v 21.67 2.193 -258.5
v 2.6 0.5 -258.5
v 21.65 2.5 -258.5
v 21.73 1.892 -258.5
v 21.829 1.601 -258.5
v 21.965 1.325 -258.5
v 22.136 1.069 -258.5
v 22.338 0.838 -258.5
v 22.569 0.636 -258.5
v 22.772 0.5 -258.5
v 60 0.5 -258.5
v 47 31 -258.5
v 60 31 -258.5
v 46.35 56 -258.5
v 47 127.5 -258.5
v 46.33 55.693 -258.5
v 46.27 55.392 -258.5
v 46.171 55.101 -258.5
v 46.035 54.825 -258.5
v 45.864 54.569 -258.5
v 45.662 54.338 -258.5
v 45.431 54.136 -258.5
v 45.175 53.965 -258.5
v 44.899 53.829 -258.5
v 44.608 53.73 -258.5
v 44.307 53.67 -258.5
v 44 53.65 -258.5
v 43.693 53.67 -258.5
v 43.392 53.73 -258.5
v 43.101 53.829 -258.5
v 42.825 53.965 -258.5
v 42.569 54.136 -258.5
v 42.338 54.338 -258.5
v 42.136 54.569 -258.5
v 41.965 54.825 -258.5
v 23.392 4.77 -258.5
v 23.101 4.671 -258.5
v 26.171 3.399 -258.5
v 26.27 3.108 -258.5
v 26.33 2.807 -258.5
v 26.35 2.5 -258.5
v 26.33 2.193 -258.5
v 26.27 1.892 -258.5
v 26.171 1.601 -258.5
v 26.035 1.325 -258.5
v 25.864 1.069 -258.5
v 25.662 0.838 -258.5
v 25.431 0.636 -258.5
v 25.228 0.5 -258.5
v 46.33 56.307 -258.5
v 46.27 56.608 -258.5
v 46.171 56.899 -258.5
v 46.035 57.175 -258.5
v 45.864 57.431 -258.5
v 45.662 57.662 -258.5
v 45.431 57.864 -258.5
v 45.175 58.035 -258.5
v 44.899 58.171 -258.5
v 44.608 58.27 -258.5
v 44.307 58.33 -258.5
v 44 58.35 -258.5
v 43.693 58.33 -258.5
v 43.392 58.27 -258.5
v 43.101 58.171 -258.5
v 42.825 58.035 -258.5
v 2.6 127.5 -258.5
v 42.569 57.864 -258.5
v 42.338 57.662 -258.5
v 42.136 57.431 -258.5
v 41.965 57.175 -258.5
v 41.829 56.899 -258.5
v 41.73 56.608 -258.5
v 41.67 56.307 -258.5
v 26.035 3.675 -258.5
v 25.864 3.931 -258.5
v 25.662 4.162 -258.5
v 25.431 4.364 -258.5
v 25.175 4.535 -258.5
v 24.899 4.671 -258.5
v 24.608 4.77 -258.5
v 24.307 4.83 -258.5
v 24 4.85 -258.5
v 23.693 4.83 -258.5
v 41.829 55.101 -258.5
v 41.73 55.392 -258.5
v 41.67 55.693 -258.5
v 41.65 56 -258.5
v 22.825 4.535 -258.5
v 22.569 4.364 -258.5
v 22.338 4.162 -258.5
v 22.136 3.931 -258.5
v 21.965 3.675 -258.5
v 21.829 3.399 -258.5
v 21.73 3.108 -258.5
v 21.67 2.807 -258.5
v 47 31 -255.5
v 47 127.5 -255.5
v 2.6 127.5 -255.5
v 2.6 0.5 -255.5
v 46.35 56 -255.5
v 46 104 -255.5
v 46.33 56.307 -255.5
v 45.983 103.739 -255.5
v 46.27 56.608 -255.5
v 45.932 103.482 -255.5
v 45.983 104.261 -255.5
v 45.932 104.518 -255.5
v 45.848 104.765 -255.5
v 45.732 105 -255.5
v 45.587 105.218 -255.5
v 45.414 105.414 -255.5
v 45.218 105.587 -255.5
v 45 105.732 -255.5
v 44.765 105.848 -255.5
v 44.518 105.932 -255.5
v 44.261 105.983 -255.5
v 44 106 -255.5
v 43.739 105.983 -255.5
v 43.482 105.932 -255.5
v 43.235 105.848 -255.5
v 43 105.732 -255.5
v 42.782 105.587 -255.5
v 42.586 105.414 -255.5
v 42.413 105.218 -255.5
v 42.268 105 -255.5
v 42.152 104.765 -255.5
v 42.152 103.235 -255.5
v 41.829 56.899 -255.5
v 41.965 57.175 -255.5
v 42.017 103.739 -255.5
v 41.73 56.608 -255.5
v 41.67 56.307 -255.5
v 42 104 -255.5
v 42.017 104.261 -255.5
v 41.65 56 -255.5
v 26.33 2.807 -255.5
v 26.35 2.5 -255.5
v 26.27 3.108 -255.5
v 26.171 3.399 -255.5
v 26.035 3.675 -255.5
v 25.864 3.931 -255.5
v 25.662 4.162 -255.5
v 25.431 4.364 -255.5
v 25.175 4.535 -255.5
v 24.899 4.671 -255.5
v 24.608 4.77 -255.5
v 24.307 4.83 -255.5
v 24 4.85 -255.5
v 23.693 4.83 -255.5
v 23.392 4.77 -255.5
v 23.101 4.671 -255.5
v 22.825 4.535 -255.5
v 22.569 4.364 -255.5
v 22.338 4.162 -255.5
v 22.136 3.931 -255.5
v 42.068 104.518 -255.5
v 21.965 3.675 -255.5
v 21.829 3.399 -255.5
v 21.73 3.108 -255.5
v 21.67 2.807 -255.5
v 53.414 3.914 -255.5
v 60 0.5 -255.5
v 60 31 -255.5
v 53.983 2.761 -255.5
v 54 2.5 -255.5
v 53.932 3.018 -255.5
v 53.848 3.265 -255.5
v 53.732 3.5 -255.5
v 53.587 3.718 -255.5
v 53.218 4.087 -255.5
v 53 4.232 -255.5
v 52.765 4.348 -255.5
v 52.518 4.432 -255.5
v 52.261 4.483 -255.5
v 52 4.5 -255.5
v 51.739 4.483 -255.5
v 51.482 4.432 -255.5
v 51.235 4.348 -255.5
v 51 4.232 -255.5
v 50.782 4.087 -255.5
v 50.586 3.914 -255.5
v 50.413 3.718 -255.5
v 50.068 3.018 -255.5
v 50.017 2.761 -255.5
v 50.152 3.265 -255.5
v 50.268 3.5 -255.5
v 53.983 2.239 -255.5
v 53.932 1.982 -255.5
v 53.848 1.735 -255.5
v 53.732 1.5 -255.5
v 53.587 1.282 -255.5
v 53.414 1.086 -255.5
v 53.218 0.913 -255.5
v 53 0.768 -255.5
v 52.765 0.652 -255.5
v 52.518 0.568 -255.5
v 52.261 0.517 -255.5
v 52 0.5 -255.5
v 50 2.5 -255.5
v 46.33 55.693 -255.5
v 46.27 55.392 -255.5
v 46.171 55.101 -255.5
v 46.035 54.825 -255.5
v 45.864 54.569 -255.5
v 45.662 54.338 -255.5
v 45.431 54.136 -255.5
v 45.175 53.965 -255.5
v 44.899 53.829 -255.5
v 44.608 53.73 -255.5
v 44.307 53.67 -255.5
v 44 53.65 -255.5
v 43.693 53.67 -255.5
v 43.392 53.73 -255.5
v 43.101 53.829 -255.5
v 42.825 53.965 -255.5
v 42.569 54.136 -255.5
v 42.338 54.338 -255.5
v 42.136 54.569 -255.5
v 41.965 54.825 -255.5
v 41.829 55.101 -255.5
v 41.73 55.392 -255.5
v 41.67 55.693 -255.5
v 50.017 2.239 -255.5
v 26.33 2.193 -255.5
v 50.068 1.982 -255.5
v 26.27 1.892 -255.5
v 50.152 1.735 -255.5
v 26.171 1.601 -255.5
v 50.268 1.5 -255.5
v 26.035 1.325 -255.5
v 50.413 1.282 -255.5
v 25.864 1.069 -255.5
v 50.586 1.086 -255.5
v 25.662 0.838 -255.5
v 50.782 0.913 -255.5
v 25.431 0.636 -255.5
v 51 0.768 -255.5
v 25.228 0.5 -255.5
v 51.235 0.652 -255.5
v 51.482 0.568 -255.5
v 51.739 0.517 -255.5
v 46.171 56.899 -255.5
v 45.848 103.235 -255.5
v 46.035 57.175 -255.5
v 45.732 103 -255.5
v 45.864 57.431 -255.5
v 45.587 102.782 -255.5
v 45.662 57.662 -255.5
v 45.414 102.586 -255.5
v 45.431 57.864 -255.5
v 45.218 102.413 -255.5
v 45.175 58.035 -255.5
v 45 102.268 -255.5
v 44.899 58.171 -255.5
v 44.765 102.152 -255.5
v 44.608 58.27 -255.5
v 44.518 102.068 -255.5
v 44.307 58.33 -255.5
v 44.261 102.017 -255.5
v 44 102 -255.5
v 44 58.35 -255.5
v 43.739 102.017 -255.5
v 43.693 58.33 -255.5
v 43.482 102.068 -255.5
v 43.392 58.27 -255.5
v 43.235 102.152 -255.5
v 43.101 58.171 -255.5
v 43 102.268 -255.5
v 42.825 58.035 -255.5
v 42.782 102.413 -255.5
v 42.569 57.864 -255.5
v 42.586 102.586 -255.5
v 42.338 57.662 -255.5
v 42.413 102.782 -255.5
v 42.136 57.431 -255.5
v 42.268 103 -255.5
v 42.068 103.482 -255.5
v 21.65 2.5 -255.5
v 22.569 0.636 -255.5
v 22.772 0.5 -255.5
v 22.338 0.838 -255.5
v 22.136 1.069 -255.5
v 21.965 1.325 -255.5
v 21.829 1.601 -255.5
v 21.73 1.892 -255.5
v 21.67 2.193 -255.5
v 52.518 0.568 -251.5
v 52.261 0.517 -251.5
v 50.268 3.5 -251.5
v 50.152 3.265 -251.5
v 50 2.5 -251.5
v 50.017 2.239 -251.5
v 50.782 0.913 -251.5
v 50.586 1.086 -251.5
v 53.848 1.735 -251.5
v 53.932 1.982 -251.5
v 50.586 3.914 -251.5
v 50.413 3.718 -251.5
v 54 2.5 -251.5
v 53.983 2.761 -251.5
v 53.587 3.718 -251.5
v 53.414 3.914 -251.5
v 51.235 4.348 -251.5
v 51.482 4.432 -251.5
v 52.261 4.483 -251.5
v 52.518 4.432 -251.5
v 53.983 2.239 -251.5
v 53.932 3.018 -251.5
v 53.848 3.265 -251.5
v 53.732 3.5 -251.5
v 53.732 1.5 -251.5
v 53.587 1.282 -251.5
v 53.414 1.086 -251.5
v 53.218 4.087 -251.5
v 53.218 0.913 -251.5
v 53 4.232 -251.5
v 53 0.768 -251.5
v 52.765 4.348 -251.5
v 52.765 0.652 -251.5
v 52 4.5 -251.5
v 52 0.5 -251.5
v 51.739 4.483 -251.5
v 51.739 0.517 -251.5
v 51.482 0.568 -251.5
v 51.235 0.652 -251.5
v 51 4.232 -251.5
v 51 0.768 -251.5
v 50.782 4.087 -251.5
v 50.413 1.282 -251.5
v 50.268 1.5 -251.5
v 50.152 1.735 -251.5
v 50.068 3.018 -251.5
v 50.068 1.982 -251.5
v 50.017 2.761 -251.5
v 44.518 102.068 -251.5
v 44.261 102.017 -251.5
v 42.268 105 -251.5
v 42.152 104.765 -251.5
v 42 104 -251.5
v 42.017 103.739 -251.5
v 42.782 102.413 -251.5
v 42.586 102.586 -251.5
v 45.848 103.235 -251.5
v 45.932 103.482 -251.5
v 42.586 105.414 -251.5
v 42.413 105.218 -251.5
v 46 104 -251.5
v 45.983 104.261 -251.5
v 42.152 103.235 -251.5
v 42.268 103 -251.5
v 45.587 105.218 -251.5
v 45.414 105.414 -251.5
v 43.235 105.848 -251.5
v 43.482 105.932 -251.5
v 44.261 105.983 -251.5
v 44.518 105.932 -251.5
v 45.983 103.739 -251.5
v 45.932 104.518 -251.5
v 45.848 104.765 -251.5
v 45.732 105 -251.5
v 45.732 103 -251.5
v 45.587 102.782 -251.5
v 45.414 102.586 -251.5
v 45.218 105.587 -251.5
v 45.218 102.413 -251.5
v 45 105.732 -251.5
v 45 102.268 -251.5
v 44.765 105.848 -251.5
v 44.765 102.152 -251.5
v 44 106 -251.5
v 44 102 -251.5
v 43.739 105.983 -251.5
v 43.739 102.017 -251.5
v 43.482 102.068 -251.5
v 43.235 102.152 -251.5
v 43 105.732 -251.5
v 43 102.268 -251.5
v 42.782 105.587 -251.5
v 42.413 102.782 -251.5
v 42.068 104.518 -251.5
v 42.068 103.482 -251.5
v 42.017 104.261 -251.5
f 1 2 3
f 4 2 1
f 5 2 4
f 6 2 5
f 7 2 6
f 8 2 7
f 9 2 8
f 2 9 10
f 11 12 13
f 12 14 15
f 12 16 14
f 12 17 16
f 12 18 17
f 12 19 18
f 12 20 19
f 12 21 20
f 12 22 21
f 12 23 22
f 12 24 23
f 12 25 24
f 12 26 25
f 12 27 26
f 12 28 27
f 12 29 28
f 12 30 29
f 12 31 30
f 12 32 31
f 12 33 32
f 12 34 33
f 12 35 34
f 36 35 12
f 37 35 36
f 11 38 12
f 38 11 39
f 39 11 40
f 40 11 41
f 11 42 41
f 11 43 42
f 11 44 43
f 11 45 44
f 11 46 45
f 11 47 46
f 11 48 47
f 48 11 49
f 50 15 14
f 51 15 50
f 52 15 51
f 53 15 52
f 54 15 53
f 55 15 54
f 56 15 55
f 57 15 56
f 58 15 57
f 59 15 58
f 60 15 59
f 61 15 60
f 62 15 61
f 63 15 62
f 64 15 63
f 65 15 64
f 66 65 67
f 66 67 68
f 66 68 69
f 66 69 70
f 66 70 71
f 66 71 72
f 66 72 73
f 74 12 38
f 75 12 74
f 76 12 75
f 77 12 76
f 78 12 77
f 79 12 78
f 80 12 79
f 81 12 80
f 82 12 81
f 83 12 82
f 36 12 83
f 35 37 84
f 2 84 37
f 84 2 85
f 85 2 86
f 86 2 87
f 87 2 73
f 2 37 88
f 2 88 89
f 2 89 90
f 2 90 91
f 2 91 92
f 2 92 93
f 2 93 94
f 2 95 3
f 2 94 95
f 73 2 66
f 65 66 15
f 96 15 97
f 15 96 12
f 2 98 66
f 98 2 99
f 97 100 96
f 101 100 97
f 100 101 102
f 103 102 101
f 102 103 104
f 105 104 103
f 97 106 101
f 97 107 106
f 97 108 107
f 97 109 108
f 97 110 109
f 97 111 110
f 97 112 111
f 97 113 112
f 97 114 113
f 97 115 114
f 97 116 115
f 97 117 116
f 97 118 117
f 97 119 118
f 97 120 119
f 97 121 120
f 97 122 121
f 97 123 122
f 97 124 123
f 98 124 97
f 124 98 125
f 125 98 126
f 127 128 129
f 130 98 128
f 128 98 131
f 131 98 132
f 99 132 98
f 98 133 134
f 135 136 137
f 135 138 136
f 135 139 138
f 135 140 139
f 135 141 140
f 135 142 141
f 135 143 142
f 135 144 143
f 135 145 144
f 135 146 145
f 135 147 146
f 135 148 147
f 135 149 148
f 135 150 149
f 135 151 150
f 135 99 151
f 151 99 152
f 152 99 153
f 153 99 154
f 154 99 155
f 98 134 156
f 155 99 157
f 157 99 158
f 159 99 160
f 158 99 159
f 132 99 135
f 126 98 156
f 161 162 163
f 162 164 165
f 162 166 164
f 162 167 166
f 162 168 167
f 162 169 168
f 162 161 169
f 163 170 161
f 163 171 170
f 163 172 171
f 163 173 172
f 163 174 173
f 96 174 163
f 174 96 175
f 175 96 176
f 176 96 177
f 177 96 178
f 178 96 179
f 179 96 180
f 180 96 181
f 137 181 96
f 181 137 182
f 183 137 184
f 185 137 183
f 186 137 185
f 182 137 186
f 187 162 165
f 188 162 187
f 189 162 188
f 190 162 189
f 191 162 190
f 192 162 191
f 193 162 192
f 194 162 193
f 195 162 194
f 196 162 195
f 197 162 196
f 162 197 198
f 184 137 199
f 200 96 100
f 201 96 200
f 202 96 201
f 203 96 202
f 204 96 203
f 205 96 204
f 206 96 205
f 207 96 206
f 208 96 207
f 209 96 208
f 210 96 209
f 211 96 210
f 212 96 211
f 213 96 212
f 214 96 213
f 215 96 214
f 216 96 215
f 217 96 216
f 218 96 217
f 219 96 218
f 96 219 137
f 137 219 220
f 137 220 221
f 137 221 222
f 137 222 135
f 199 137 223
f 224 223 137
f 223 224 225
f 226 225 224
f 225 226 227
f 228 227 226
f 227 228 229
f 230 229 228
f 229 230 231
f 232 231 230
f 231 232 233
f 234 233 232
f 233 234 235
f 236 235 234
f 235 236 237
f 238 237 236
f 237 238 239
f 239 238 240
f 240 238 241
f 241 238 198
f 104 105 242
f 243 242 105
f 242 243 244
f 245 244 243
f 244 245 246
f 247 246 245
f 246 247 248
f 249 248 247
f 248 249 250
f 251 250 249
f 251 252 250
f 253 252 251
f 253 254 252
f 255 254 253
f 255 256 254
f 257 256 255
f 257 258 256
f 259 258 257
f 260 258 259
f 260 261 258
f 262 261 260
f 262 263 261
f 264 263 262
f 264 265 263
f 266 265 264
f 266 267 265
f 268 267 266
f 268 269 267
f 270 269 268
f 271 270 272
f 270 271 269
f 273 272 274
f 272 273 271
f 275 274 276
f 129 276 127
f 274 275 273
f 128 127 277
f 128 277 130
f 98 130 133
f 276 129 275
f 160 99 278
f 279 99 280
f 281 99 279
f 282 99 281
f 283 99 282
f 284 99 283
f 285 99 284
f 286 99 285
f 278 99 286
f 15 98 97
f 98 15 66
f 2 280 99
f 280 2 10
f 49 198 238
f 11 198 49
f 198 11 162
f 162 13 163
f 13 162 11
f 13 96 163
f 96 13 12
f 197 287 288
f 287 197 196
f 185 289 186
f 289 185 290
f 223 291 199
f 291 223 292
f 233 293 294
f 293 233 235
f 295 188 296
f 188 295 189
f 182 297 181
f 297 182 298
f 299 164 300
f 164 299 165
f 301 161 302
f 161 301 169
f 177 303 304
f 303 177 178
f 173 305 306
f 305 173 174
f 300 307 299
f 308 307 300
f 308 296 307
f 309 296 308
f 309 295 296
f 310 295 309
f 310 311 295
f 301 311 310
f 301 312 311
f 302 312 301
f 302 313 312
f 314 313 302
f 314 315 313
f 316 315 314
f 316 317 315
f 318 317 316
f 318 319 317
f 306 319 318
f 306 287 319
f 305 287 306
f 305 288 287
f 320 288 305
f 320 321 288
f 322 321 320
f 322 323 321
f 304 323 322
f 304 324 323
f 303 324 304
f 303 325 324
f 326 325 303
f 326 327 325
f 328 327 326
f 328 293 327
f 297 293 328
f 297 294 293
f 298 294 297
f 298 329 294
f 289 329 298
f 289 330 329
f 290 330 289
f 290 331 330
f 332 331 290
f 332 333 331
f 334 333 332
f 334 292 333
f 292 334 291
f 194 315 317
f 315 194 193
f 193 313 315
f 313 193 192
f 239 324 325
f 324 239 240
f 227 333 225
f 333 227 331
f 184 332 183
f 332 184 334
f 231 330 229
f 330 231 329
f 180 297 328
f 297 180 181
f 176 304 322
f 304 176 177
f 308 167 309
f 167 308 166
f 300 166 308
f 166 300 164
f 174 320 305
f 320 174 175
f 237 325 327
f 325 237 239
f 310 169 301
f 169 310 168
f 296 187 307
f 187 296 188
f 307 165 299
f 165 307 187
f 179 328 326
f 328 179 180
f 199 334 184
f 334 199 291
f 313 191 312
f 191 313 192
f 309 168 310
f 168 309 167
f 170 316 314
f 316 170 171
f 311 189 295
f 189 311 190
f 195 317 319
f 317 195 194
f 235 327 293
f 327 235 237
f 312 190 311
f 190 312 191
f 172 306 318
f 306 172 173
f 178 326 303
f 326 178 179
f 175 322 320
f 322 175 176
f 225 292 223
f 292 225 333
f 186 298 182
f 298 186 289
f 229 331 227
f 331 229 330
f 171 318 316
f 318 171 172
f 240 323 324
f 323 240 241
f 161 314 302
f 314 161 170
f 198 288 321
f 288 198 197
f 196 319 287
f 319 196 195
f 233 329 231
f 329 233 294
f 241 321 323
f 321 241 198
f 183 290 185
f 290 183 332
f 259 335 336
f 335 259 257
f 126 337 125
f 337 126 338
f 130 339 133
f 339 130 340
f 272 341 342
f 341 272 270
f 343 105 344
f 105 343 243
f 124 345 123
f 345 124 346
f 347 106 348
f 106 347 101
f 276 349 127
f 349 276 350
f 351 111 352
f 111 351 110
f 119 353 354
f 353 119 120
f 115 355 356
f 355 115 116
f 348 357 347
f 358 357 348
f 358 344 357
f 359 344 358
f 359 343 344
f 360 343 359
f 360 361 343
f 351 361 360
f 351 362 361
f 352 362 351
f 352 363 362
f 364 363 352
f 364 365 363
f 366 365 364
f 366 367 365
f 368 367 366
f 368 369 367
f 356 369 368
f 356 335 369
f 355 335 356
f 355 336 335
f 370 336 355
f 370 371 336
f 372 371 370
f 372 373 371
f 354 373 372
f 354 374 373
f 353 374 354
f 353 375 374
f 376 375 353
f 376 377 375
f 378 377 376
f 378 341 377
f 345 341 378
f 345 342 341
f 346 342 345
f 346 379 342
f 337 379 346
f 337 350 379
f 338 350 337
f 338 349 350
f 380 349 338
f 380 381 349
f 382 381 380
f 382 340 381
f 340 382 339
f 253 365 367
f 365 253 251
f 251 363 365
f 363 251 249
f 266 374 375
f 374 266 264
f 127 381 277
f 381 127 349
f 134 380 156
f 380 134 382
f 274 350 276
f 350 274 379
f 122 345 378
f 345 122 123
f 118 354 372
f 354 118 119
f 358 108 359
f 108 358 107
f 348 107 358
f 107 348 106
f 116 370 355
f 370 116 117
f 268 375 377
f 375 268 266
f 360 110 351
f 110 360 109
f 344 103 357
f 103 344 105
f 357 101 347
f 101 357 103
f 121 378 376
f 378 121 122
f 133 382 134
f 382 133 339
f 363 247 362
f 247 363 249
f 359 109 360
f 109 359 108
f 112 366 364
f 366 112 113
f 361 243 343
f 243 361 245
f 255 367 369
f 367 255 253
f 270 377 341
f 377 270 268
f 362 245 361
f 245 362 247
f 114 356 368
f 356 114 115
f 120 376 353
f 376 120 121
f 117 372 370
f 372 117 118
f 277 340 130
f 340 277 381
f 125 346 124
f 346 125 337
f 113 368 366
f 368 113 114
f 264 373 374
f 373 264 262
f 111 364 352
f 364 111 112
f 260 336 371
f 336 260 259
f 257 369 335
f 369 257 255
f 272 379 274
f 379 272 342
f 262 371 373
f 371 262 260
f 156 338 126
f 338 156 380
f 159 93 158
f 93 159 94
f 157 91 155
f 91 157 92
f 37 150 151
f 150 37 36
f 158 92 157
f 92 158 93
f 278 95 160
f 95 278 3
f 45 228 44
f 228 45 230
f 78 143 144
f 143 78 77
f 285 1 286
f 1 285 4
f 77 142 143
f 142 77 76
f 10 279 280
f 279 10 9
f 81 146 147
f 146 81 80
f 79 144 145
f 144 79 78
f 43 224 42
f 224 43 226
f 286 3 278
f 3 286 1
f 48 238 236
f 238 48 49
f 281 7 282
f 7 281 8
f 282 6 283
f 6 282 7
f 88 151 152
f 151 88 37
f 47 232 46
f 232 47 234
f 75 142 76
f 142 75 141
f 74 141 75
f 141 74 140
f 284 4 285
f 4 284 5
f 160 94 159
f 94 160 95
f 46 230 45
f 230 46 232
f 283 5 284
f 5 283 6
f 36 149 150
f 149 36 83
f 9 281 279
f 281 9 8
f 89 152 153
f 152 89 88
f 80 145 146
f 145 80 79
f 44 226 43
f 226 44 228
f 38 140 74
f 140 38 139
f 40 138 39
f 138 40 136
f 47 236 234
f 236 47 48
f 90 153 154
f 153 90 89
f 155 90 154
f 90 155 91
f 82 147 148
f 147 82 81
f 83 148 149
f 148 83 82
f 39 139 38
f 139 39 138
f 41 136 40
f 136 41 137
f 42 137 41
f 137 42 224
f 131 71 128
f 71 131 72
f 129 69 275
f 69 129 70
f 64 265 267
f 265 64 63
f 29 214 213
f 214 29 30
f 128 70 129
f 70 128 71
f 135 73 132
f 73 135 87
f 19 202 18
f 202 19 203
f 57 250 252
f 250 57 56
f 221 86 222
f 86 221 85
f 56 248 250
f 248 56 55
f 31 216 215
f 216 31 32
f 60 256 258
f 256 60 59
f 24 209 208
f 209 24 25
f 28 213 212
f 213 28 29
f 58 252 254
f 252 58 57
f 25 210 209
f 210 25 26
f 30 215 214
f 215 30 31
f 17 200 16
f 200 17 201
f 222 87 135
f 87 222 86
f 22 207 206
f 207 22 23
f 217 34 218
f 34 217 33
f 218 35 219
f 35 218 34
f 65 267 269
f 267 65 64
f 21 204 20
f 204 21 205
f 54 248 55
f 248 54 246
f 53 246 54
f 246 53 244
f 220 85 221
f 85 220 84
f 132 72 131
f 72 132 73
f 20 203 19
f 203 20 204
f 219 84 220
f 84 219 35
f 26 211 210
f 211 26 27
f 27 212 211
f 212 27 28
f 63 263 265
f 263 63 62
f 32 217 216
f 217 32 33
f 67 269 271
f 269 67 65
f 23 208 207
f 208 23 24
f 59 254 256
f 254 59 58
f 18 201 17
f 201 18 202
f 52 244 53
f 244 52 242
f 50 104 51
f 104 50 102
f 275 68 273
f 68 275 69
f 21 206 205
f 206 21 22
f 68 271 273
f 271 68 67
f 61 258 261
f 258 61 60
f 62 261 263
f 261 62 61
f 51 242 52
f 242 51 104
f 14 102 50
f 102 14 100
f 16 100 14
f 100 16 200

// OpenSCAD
hinge_part = "side_right";
include <../direct_mount_enclosure.scad>;
